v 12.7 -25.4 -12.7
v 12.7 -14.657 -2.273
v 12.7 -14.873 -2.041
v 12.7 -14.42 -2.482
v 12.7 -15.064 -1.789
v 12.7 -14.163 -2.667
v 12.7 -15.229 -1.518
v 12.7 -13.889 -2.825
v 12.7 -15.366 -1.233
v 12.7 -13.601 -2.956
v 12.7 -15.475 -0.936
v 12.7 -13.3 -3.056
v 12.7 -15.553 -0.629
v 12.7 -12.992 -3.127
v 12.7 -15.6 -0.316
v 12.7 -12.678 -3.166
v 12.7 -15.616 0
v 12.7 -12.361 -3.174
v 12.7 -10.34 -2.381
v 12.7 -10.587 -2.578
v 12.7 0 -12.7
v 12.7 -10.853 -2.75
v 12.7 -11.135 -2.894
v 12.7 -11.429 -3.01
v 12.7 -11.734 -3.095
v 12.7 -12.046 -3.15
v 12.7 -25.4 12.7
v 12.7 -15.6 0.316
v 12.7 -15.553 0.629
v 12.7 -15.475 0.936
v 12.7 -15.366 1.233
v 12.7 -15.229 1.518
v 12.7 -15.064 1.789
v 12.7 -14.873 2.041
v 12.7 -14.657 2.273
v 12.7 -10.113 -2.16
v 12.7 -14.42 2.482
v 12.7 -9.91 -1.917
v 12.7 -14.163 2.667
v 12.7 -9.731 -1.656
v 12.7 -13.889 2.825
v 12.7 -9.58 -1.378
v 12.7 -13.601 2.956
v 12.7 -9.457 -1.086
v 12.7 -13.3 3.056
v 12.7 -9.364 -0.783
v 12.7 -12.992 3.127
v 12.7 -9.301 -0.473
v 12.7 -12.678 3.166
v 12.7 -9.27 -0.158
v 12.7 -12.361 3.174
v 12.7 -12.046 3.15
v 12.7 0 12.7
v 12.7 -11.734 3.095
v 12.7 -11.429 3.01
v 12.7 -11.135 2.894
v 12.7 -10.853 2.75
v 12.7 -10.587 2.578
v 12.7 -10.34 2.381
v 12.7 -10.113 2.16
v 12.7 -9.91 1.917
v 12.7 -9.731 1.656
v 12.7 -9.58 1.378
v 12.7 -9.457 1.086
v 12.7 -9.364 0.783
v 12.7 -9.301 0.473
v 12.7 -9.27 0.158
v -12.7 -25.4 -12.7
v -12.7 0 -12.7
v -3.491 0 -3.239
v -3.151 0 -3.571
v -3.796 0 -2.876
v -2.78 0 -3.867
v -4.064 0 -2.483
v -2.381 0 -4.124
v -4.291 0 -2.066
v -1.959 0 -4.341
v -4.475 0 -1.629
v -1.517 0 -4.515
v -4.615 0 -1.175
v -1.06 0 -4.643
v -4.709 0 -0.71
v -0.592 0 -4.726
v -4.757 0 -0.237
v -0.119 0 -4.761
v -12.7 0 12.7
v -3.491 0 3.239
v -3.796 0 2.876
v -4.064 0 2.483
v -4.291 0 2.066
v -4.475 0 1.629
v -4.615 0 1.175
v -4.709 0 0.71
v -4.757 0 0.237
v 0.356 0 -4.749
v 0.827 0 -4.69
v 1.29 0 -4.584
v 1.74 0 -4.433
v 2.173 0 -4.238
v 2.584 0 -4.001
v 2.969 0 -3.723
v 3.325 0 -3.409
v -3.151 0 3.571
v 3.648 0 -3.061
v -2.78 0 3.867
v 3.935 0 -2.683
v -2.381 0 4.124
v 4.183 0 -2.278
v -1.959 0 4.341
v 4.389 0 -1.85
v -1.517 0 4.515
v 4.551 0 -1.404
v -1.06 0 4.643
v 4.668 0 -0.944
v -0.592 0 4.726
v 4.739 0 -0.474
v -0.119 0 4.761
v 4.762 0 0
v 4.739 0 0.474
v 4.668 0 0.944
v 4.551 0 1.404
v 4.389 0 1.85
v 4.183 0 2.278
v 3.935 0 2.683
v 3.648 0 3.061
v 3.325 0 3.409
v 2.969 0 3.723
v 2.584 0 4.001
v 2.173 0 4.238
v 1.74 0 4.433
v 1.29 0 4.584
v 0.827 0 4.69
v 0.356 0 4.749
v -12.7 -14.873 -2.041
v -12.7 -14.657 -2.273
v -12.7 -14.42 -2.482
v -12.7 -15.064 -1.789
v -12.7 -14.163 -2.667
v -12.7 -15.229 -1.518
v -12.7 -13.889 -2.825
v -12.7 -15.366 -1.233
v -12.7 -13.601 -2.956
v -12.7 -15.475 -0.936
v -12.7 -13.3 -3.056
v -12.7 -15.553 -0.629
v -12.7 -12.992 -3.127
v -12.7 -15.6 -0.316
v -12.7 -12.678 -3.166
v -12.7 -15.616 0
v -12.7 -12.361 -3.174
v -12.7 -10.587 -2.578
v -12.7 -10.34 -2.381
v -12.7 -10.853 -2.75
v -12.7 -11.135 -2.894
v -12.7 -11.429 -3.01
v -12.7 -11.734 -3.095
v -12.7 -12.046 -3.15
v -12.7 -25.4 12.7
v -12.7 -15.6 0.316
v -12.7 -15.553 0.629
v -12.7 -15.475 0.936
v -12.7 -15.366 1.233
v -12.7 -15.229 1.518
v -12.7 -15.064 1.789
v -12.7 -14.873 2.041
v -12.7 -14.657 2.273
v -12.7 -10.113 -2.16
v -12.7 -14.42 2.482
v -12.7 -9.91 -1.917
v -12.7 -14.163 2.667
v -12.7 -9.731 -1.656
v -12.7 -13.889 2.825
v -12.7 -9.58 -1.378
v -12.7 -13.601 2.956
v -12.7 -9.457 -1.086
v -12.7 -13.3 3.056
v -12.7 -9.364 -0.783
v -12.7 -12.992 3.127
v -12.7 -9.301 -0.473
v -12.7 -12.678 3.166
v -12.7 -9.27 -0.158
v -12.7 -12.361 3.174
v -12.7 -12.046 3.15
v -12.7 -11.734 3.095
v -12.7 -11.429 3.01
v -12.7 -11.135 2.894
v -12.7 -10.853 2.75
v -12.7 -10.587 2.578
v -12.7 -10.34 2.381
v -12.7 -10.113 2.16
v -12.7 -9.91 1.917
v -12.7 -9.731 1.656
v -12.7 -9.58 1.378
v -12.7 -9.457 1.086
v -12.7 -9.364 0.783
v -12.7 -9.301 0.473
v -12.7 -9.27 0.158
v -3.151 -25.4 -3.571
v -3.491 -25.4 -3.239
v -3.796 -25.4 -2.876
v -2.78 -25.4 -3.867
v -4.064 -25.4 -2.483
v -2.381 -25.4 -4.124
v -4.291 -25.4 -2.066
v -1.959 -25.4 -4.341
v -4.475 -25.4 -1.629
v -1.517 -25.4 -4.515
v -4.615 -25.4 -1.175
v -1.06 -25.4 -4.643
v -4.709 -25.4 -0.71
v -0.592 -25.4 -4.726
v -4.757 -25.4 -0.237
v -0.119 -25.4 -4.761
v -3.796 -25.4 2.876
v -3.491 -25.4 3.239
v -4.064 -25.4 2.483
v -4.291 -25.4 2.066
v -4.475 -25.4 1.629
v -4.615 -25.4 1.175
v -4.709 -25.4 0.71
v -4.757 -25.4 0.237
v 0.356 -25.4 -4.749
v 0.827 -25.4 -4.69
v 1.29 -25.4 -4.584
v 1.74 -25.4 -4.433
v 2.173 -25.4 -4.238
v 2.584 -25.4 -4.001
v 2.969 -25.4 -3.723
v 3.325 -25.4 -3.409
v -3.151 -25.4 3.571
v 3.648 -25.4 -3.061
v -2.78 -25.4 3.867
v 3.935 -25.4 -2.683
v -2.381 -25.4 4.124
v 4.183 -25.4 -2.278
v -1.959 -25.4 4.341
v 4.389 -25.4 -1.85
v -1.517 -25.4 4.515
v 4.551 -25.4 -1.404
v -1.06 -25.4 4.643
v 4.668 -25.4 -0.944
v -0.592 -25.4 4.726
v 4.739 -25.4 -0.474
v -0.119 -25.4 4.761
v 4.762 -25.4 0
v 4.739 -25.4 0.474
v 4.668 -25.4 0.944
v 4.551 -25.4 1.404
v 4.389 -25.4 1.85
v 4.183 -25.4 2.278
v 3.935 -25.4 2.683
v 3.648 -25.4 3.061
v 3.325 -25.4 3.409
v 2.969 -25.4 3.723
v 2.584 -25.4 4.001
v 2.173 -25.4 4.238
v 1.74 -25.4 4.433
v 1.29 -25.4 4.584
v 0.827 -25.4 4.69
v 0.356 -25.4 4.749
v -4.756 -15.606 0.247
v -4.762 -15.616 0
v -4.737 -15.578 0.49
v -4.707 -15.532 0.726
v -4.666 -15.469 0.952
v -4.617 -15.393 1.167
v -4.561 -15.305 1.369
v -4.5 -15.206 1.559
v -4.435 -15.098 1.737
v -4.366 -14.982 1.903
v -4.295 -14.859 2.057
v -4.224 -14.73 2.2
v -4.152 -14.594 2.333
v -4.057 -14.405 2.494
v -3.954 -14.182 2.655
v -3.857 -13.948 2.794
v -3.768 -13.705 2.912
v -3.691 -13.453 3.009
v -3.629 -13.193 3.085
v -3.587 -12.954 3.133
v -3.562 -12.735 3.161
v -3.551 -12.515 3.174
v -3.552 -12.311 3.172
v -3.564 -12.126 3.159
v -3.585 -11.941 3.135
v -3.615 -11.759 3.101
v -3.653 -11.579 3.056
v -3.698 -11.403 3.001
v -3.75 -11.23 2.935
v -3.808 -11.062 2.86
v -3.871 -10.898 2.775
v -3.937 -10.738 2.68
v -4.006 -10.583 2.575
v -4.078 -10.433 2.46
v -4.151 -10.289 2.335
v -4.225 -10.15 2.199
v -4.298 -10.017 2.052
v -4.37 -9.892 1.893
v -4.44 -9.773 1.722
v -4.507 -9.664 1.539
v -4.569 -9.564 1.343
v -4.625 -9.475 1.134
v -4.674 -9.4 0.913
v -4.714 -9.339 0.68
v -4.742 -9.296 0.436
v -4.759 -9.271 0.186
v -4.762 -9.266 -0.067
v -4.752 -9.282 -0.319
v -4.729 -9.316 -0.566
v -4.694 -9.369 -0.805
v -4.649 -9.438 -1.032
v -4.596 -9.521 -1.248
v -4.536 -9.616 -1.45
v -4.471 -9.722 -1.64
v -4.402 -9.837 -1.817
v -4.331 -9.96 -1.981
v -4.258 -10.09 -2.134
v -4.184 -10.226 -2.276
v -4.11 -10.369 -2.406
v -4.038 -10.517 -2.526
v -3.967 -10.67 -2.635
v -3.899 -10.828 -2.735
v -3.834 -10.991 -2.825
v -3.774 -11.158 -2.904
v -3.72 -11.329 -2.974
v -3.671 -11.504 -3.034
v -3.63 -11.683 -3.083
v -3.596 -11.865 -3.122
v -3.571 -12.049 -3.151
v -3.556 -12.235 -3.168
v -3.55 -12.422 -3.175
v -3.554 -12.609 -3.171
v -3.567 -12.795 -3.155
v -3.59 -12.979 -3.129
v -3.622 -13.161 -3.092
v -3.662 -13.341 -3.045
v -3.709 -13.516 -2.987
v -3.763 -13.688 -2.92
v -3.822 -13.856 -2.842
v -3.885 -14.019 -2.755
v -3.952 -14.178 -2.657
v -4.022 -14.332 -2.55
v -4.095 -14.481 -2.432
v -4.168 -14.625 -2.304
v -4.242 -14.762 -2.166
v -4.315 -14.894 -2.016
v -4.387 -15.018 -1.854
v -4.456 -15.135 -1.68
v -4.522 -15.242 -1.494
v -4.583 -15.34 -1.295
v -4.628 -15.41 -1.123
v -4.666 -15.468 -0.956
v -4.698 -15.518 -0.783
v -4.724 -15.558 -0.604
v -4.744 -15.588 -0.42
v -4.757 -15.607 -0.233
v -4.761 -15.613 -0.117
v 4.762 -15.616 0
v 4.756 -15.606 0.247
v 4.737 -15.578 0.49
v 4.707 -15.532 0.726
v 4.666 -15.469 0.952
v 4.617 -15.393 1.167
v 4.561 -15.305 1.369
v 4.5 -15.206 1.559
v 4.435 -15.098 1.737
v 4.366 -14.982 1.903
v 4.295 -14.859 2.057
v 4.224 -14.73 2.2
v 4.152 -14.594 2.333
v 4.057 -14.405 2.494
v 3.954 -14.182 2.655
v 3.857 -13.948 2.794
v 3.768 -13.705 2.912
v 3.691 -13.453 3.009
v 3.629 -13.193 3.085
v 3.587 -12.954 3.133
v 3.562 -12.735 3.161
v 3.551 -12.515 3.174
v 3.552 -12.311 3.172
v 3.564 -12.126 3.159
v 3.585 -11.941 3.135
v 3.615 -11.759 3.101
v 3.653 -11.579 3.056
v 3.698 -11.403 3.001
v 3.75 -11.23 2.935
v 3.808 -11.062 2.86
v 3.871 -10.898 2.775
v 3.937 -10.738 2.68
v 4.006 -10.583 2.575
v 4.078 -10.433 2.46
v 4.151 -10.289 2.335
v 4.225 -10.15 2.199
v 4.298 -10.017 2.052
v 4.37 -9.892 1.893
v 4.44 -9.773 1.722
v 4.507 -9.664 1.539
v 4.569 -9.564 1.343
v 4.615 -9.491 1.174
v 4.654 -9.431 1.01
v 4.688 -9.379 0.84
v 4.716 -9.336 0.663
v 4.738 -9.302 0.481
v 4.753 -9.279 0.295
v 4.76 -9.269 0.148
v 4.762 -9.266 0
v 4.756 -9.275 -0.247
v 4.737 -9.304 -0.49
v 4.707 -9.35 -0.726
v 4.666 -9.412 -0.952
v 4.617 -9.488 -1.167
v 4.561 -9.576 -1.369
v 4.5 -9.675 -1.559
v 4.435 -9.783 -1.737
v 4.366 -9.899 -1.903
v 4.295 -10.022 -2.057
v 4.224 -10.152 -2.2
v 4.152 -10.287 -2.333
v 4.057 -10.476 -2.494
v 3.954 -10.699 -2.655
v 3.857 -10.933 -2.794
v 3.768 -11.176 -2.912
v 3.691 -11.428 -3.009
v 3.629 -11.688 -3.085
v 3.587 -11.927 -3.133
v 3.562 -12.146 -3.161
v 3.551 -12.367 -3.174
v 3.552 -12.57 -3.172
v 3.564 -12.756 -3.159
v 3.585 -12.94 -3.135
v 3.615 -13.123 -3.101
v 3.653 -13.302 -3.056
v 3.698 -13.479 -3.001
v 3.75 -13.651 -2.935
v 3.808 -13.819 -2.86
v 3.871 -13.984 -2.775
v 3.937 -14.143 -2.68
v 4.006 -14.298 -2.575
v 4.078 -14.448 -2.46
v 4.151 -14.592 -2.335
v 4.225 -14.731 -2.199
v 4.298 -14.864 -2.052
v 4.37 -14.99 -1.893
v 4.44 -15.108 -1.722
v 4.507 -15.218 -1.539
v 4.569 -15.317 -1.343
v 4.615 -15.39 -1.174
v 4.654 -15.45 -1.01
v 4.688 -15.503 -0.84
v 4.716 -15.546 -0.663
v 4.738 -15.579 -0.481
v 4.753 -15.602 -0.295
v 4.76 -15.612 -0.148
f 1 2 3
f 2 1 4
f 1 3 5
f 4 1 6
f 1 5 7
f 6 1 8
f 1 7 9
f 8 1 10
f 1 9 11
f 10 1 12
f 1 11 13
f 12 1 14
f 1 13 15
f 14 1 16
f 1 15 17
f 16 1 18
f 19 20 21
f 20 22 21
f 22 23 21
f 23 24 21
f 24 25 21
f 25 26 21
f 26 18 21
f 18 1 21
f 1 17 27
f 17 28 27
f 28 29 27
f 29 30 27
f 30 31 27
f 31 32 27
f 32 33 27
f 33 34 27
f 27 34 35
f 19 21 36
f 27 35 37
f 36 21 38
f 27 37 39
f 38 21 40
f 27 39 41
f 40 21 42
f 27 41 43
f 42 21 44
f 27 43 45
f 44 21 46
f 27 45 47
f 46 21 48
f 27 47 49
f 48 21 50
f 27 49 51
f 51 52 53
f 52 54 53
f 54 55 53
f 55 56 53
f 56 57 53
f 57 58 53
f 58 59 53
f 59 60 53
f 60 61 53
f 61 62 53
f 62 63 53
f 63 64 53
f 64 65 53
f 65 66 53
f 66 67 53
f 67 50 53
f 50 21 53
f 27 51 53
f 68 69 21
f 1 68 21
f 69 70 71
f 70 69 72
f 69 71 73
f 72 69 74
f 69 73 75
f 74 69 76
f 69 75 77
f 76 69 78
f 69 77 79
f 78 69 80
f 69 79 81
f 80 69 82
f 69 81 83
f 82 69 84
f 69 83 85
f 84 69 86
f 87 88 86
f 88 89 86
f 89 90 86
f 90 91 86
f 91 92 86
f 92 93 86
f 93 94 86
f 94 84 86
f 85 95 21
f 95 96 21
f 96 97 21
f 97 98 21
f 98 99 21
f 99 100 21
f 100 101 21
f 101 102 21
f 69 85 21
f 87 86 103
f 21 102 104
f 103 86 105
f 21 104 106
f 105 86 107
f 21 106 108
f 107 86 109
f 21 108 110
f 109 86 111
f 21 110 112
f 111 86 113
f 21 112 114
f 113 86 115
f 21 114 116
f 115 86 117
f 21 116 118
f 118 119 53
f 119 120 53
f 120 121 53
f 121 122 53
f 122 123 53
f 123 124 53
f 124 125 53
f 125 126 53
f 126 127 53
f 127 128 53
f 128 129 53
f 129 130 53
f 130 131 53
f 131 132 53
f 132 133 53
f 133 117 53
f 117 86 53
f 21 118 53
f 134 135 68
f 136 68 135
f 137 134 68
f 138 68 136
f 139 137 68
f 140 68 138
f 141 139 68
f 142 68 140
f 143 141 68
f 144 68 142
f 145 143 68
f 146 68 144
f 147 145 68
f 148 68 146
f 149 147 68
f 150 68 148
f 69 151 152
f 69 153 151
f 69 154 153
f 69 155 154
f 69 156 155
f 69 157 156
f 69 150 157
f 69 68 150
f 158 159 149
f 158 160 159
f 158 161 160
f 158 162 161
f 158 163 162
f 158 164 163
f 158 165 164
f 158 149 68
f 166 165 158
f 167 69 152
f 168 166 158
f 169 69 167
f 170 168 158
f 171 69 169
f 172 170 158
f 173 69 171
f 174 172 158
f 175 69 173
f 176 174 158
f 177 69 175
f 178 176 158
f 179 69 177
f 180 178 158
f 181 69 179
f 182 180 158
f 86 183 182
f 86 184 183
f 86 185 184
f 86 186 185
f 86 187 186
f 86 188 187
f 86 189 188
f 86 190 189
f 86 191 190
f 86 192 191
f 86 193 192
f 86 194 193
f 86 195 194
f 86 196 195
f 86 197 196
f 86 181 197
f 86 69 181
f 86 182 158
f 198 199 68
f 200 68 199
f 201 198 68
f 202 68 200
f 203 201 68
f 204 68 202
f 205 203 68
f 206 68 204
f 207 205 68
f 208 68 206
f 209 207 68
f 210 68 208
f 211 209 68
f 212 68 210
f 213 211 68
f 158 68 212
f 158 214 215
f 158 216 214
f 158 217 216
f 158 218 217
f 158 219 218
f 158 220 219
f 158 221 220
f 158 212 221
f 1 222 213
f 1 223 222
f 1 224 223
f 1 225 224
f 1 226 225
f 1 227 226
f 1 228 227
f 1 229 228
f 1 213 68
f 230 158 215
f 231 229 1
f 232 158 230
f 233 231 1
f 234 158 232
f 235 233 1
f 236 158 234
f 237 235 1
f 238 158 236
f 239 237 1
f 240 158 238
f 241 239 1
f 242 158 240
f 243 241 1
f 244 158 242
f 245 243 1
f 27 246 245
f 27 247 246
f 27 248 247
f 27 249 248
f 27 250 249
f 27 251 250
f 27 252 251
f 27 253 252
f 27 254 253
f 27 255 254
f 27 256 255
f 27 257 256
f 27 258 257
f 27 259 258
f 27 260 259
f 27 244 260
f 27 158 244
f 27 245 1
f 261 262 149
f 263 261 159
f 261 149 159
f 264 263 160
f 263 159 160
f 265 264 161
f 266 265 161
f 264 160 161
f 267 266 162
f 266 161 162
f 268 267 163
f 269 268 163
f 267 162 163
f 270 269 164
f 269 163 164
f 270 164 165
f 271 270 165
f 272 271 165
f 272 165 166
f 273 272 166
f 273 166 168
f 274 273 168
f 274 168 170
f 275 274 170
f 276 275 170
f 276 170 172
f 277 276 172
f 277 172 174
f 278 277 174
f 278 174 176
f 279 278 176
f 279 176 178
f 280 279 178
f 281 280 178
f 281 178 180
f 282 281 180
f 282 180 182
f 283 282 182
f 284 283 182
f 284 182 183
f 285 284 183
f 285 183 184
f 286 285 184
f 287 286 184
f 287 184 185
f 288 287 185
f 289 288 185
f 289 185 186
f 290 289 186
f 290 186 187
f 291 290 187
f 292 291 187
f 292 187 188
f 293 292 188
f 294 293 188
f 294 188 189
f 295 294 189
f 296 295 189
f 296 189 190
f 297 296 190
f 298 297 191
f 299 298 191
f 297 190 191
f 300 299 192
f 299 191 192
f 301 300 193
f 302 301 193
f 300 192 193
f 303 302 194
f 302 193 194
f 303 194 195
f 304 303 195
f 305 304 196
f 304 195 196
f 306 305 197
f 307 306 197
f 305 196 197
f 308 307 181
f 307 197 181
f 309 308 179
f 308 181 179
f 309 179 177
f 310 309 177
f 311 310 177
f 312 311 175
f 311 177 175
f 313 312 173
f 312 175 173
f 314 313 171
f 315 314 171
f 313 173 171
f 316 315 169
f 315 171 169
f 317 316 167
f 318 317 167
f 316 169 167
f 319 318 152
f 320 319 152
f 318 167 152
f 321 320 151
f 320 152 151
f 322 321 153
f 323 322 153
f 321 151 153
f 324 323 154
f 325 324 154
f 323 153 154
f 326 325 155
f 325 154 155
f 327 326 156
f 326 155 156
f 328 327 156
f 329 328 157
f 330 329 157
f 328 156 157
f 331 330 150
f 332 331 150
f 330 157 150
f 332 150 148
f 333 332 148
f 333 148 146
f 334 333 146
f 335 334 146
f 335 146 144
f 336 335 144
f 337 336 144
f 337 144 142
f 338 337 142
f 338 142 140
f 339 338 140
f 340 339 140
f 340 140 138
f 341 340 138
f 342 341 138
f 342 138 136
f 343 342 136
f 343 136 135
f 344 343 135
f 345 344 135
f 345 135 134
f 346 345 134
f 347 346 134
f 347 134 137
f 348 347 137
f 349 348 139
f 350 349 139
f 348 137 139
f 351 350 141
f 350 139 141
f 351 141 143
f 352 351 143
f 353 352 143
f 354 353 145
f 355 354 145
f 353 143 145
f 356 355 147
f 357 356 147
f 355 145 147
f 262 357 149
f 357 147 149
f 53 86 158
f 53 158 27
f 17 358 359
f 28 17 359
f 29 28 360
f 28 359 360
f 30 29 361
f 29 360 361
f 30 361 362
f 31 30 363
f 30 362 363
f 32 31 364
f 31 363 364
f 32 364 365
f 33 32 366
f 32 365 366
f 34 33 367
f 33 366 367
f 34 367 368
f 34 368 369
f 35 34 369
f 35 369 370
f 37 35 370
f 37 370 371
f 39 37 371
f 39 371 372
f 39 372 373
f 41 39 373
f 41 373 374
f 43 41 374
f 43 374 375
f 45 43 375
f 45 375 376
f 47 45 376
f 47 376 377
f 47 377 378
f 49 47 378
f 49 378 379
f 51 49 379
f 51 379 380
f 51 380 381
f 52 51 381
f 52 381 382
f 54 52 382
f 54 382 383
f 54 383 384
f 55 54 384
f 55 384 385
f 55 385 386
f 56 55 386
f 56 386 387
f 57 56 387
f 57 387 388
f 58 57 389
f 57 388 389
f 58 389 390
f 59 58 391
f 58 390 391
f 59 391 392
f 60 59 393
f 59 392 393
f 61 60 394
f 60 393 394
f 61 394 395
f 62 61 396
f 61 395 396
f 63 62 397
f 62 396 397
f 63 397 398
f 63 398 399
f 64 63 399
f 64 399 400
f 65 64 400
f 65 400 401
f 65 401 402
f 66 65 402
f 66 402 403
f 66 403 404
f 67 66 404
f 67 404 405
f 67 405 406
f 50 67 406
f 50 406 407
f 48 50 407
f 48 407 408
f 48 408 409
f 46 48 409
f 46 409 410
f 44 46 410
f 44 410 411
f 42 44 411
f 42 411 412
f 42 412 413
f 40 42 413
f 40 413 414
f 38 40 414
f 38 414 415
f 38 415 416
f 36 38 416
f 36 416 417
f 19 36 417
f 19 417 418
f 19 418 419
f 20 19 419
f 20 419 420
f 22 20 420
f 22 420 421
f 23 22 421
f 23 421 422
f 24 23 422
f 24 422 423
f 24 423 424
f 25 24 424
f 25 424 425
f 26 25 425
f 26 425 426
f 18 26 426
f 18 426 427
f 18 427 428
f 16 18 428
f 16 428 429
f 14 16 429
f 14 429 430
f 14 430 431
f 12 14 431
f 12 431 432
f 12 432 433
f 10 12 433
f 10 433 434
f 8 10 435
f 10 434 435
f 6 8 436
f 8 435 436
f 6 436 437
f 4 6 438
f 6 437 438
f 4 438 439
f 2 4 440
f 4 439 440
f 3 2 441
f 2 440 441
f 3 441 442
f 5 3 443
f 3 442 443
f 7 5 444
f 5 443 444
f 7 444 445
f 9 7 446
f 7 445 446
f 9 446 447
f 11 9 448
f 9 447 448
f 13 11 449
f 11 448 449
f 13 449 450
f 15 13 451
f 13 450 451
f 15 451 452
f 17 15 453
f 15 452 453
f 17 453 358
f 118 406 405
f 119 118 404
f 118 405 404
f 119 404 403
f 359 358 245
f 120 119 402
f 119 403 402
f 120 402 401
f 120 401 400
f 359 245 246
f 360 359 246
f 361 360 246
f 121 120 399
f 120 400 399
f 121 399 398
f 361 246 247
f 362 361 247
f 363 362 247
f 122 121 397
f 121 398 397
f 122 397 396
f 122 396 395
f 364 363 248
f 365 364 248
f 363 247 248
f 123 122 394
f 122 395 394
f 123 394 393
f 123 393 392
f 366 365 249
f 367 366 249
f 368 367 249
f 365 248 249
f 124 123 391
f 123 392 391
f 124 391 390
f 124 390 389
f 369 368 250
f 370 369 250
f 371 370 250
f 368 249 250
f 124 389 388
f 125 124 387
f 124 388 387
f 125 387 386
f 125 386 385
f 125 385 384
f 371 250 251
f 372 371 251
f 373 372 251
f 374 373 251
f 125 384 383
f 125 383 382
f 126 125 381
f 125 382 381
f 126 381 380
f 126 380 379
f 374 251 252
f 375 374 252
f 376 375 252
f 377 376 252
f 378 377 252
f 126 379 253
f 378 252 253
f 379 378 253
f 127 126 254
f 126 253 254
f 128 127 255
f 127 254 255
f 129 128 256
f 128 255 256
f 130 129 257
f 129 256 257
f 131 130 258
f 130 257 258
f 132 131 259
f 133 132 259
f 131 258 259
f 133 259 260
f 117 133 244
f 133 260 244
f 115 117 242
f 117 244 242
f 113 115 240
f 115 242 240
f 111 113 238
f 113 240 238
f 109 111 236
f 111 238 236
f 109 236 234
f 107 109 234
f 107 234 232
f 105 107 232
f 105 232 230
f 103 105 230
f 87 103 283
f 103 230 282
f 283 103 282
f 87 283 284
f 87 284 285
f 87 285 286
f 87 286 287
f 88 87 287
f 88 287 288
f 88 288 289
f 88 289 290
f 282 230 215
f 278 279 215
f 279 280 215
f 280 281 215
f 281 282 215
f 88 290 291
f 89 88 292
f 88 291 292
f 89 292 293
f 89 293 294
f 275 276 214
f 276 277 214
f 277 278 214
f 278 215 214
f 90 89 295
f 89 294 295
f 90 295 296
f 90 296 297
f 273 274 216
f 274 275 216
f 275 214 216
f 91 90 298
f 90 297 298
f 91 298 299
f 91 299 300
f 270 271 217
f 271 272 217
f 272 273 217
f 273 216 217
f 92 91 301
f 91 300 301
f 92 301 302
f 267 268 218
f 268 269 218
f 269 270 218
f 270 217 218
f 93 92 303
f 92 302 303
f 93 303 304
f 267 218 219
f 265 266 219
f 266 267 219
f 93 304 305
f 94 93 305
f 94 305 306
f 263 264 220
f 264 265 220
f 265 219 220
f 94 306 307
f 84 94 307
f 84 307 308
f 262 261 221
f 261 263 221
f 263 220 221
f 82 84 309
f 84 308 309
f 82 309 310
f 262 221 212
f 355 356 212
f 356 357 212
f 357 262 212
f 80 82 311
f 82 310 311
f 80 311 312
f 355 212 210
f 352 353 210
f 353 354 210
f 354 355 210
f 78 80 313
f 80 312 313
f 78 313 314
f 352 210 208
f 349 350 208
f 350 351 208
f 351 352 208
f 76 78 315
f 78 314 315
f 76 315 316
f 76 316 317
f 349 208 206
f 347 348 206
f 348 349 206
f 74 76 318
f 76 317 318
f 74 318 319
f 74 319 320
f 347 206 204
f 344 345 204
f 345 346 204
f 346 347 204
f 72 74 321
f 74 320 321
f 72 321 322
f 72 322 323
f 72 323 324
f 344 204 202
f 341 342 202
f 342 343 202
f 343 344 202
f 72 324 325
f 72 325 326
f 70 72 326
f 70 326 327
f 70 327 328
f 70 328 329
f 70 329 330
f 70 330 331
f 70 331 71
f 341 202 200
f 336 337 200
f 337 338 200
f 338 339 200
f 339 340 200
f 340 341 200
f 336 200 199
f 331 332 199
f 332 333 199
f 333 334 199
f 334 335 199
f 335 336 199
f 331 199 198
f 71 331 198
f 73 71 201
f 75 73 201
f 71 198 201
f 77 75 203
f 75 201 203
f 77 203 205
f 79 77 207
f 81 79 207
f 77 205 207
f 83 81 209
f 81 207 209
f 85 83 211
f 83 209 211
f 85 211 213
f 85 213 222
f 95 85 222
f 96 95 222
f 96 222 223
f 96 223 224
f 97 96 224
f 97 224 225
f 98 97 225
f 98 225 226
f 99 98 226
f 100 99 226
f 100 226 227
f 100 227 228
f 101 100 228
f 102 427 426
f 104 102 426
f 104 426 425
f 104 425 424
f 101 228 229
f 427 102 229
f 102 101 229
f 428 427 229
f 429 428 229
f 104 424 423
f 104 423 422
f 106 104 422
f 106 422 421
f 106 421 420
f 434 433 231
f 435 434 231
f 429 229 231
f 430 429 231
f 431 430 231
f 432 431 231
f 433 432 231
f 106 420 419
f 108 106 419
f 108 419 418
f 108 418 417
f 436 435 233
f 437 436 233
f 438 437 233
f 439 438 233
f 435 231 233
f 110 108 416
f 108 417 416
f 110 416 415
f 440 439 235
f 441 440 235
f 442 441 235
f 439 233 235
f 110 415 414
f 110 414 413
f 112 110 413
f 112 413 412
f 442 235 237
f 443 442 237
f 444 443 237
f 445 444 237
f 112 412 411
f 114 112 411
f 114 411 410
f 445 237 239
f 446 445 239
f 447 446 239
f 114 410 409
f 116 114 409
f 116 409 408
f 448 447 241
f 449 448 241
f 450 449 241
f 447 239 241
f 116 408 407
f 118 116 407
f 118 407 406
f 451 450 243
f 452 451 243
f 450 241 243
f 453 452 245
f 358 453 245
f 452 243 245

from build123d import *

# Parameters (mm, degrees)
F0_W     = 25.4
F0_H     = 25.4
F1_DEPTH = 25.4
F2_R     = 4.7625
F3_DEPTH = 64.516
F4_R     = 3.175
F5_DEPTH = 53.594


with BuildPart() as f1:
    # F0 (on Front) → F1 (new body)
    with BuildSketch(Plane.XZ):
        Rectangle(F0_W, F0_H)
    extrude(amount=F1_DEPTH)

    # F2 (on face) → F3 (cut)
    with BuildSketch(Plane.XZ.offset(25.4)):
        Circle(F2_R)
    extrude(amount=-F3_DEPTH, mode=Mode.SUBTRACT)

    # F4 (on face) → F5 (cut)
    with BuildSketch(Plane(origin=(-12.7, 0, 0), x_dir=(0, -1, 0), z_dir=(-1, 0, 0))):
        with Locations((12.440579, 0)):
            Circle(F4_R)
    extrude(amount=-F5_DEPTH, mode=Mode.SUBTRACT)


solid = f1.part
